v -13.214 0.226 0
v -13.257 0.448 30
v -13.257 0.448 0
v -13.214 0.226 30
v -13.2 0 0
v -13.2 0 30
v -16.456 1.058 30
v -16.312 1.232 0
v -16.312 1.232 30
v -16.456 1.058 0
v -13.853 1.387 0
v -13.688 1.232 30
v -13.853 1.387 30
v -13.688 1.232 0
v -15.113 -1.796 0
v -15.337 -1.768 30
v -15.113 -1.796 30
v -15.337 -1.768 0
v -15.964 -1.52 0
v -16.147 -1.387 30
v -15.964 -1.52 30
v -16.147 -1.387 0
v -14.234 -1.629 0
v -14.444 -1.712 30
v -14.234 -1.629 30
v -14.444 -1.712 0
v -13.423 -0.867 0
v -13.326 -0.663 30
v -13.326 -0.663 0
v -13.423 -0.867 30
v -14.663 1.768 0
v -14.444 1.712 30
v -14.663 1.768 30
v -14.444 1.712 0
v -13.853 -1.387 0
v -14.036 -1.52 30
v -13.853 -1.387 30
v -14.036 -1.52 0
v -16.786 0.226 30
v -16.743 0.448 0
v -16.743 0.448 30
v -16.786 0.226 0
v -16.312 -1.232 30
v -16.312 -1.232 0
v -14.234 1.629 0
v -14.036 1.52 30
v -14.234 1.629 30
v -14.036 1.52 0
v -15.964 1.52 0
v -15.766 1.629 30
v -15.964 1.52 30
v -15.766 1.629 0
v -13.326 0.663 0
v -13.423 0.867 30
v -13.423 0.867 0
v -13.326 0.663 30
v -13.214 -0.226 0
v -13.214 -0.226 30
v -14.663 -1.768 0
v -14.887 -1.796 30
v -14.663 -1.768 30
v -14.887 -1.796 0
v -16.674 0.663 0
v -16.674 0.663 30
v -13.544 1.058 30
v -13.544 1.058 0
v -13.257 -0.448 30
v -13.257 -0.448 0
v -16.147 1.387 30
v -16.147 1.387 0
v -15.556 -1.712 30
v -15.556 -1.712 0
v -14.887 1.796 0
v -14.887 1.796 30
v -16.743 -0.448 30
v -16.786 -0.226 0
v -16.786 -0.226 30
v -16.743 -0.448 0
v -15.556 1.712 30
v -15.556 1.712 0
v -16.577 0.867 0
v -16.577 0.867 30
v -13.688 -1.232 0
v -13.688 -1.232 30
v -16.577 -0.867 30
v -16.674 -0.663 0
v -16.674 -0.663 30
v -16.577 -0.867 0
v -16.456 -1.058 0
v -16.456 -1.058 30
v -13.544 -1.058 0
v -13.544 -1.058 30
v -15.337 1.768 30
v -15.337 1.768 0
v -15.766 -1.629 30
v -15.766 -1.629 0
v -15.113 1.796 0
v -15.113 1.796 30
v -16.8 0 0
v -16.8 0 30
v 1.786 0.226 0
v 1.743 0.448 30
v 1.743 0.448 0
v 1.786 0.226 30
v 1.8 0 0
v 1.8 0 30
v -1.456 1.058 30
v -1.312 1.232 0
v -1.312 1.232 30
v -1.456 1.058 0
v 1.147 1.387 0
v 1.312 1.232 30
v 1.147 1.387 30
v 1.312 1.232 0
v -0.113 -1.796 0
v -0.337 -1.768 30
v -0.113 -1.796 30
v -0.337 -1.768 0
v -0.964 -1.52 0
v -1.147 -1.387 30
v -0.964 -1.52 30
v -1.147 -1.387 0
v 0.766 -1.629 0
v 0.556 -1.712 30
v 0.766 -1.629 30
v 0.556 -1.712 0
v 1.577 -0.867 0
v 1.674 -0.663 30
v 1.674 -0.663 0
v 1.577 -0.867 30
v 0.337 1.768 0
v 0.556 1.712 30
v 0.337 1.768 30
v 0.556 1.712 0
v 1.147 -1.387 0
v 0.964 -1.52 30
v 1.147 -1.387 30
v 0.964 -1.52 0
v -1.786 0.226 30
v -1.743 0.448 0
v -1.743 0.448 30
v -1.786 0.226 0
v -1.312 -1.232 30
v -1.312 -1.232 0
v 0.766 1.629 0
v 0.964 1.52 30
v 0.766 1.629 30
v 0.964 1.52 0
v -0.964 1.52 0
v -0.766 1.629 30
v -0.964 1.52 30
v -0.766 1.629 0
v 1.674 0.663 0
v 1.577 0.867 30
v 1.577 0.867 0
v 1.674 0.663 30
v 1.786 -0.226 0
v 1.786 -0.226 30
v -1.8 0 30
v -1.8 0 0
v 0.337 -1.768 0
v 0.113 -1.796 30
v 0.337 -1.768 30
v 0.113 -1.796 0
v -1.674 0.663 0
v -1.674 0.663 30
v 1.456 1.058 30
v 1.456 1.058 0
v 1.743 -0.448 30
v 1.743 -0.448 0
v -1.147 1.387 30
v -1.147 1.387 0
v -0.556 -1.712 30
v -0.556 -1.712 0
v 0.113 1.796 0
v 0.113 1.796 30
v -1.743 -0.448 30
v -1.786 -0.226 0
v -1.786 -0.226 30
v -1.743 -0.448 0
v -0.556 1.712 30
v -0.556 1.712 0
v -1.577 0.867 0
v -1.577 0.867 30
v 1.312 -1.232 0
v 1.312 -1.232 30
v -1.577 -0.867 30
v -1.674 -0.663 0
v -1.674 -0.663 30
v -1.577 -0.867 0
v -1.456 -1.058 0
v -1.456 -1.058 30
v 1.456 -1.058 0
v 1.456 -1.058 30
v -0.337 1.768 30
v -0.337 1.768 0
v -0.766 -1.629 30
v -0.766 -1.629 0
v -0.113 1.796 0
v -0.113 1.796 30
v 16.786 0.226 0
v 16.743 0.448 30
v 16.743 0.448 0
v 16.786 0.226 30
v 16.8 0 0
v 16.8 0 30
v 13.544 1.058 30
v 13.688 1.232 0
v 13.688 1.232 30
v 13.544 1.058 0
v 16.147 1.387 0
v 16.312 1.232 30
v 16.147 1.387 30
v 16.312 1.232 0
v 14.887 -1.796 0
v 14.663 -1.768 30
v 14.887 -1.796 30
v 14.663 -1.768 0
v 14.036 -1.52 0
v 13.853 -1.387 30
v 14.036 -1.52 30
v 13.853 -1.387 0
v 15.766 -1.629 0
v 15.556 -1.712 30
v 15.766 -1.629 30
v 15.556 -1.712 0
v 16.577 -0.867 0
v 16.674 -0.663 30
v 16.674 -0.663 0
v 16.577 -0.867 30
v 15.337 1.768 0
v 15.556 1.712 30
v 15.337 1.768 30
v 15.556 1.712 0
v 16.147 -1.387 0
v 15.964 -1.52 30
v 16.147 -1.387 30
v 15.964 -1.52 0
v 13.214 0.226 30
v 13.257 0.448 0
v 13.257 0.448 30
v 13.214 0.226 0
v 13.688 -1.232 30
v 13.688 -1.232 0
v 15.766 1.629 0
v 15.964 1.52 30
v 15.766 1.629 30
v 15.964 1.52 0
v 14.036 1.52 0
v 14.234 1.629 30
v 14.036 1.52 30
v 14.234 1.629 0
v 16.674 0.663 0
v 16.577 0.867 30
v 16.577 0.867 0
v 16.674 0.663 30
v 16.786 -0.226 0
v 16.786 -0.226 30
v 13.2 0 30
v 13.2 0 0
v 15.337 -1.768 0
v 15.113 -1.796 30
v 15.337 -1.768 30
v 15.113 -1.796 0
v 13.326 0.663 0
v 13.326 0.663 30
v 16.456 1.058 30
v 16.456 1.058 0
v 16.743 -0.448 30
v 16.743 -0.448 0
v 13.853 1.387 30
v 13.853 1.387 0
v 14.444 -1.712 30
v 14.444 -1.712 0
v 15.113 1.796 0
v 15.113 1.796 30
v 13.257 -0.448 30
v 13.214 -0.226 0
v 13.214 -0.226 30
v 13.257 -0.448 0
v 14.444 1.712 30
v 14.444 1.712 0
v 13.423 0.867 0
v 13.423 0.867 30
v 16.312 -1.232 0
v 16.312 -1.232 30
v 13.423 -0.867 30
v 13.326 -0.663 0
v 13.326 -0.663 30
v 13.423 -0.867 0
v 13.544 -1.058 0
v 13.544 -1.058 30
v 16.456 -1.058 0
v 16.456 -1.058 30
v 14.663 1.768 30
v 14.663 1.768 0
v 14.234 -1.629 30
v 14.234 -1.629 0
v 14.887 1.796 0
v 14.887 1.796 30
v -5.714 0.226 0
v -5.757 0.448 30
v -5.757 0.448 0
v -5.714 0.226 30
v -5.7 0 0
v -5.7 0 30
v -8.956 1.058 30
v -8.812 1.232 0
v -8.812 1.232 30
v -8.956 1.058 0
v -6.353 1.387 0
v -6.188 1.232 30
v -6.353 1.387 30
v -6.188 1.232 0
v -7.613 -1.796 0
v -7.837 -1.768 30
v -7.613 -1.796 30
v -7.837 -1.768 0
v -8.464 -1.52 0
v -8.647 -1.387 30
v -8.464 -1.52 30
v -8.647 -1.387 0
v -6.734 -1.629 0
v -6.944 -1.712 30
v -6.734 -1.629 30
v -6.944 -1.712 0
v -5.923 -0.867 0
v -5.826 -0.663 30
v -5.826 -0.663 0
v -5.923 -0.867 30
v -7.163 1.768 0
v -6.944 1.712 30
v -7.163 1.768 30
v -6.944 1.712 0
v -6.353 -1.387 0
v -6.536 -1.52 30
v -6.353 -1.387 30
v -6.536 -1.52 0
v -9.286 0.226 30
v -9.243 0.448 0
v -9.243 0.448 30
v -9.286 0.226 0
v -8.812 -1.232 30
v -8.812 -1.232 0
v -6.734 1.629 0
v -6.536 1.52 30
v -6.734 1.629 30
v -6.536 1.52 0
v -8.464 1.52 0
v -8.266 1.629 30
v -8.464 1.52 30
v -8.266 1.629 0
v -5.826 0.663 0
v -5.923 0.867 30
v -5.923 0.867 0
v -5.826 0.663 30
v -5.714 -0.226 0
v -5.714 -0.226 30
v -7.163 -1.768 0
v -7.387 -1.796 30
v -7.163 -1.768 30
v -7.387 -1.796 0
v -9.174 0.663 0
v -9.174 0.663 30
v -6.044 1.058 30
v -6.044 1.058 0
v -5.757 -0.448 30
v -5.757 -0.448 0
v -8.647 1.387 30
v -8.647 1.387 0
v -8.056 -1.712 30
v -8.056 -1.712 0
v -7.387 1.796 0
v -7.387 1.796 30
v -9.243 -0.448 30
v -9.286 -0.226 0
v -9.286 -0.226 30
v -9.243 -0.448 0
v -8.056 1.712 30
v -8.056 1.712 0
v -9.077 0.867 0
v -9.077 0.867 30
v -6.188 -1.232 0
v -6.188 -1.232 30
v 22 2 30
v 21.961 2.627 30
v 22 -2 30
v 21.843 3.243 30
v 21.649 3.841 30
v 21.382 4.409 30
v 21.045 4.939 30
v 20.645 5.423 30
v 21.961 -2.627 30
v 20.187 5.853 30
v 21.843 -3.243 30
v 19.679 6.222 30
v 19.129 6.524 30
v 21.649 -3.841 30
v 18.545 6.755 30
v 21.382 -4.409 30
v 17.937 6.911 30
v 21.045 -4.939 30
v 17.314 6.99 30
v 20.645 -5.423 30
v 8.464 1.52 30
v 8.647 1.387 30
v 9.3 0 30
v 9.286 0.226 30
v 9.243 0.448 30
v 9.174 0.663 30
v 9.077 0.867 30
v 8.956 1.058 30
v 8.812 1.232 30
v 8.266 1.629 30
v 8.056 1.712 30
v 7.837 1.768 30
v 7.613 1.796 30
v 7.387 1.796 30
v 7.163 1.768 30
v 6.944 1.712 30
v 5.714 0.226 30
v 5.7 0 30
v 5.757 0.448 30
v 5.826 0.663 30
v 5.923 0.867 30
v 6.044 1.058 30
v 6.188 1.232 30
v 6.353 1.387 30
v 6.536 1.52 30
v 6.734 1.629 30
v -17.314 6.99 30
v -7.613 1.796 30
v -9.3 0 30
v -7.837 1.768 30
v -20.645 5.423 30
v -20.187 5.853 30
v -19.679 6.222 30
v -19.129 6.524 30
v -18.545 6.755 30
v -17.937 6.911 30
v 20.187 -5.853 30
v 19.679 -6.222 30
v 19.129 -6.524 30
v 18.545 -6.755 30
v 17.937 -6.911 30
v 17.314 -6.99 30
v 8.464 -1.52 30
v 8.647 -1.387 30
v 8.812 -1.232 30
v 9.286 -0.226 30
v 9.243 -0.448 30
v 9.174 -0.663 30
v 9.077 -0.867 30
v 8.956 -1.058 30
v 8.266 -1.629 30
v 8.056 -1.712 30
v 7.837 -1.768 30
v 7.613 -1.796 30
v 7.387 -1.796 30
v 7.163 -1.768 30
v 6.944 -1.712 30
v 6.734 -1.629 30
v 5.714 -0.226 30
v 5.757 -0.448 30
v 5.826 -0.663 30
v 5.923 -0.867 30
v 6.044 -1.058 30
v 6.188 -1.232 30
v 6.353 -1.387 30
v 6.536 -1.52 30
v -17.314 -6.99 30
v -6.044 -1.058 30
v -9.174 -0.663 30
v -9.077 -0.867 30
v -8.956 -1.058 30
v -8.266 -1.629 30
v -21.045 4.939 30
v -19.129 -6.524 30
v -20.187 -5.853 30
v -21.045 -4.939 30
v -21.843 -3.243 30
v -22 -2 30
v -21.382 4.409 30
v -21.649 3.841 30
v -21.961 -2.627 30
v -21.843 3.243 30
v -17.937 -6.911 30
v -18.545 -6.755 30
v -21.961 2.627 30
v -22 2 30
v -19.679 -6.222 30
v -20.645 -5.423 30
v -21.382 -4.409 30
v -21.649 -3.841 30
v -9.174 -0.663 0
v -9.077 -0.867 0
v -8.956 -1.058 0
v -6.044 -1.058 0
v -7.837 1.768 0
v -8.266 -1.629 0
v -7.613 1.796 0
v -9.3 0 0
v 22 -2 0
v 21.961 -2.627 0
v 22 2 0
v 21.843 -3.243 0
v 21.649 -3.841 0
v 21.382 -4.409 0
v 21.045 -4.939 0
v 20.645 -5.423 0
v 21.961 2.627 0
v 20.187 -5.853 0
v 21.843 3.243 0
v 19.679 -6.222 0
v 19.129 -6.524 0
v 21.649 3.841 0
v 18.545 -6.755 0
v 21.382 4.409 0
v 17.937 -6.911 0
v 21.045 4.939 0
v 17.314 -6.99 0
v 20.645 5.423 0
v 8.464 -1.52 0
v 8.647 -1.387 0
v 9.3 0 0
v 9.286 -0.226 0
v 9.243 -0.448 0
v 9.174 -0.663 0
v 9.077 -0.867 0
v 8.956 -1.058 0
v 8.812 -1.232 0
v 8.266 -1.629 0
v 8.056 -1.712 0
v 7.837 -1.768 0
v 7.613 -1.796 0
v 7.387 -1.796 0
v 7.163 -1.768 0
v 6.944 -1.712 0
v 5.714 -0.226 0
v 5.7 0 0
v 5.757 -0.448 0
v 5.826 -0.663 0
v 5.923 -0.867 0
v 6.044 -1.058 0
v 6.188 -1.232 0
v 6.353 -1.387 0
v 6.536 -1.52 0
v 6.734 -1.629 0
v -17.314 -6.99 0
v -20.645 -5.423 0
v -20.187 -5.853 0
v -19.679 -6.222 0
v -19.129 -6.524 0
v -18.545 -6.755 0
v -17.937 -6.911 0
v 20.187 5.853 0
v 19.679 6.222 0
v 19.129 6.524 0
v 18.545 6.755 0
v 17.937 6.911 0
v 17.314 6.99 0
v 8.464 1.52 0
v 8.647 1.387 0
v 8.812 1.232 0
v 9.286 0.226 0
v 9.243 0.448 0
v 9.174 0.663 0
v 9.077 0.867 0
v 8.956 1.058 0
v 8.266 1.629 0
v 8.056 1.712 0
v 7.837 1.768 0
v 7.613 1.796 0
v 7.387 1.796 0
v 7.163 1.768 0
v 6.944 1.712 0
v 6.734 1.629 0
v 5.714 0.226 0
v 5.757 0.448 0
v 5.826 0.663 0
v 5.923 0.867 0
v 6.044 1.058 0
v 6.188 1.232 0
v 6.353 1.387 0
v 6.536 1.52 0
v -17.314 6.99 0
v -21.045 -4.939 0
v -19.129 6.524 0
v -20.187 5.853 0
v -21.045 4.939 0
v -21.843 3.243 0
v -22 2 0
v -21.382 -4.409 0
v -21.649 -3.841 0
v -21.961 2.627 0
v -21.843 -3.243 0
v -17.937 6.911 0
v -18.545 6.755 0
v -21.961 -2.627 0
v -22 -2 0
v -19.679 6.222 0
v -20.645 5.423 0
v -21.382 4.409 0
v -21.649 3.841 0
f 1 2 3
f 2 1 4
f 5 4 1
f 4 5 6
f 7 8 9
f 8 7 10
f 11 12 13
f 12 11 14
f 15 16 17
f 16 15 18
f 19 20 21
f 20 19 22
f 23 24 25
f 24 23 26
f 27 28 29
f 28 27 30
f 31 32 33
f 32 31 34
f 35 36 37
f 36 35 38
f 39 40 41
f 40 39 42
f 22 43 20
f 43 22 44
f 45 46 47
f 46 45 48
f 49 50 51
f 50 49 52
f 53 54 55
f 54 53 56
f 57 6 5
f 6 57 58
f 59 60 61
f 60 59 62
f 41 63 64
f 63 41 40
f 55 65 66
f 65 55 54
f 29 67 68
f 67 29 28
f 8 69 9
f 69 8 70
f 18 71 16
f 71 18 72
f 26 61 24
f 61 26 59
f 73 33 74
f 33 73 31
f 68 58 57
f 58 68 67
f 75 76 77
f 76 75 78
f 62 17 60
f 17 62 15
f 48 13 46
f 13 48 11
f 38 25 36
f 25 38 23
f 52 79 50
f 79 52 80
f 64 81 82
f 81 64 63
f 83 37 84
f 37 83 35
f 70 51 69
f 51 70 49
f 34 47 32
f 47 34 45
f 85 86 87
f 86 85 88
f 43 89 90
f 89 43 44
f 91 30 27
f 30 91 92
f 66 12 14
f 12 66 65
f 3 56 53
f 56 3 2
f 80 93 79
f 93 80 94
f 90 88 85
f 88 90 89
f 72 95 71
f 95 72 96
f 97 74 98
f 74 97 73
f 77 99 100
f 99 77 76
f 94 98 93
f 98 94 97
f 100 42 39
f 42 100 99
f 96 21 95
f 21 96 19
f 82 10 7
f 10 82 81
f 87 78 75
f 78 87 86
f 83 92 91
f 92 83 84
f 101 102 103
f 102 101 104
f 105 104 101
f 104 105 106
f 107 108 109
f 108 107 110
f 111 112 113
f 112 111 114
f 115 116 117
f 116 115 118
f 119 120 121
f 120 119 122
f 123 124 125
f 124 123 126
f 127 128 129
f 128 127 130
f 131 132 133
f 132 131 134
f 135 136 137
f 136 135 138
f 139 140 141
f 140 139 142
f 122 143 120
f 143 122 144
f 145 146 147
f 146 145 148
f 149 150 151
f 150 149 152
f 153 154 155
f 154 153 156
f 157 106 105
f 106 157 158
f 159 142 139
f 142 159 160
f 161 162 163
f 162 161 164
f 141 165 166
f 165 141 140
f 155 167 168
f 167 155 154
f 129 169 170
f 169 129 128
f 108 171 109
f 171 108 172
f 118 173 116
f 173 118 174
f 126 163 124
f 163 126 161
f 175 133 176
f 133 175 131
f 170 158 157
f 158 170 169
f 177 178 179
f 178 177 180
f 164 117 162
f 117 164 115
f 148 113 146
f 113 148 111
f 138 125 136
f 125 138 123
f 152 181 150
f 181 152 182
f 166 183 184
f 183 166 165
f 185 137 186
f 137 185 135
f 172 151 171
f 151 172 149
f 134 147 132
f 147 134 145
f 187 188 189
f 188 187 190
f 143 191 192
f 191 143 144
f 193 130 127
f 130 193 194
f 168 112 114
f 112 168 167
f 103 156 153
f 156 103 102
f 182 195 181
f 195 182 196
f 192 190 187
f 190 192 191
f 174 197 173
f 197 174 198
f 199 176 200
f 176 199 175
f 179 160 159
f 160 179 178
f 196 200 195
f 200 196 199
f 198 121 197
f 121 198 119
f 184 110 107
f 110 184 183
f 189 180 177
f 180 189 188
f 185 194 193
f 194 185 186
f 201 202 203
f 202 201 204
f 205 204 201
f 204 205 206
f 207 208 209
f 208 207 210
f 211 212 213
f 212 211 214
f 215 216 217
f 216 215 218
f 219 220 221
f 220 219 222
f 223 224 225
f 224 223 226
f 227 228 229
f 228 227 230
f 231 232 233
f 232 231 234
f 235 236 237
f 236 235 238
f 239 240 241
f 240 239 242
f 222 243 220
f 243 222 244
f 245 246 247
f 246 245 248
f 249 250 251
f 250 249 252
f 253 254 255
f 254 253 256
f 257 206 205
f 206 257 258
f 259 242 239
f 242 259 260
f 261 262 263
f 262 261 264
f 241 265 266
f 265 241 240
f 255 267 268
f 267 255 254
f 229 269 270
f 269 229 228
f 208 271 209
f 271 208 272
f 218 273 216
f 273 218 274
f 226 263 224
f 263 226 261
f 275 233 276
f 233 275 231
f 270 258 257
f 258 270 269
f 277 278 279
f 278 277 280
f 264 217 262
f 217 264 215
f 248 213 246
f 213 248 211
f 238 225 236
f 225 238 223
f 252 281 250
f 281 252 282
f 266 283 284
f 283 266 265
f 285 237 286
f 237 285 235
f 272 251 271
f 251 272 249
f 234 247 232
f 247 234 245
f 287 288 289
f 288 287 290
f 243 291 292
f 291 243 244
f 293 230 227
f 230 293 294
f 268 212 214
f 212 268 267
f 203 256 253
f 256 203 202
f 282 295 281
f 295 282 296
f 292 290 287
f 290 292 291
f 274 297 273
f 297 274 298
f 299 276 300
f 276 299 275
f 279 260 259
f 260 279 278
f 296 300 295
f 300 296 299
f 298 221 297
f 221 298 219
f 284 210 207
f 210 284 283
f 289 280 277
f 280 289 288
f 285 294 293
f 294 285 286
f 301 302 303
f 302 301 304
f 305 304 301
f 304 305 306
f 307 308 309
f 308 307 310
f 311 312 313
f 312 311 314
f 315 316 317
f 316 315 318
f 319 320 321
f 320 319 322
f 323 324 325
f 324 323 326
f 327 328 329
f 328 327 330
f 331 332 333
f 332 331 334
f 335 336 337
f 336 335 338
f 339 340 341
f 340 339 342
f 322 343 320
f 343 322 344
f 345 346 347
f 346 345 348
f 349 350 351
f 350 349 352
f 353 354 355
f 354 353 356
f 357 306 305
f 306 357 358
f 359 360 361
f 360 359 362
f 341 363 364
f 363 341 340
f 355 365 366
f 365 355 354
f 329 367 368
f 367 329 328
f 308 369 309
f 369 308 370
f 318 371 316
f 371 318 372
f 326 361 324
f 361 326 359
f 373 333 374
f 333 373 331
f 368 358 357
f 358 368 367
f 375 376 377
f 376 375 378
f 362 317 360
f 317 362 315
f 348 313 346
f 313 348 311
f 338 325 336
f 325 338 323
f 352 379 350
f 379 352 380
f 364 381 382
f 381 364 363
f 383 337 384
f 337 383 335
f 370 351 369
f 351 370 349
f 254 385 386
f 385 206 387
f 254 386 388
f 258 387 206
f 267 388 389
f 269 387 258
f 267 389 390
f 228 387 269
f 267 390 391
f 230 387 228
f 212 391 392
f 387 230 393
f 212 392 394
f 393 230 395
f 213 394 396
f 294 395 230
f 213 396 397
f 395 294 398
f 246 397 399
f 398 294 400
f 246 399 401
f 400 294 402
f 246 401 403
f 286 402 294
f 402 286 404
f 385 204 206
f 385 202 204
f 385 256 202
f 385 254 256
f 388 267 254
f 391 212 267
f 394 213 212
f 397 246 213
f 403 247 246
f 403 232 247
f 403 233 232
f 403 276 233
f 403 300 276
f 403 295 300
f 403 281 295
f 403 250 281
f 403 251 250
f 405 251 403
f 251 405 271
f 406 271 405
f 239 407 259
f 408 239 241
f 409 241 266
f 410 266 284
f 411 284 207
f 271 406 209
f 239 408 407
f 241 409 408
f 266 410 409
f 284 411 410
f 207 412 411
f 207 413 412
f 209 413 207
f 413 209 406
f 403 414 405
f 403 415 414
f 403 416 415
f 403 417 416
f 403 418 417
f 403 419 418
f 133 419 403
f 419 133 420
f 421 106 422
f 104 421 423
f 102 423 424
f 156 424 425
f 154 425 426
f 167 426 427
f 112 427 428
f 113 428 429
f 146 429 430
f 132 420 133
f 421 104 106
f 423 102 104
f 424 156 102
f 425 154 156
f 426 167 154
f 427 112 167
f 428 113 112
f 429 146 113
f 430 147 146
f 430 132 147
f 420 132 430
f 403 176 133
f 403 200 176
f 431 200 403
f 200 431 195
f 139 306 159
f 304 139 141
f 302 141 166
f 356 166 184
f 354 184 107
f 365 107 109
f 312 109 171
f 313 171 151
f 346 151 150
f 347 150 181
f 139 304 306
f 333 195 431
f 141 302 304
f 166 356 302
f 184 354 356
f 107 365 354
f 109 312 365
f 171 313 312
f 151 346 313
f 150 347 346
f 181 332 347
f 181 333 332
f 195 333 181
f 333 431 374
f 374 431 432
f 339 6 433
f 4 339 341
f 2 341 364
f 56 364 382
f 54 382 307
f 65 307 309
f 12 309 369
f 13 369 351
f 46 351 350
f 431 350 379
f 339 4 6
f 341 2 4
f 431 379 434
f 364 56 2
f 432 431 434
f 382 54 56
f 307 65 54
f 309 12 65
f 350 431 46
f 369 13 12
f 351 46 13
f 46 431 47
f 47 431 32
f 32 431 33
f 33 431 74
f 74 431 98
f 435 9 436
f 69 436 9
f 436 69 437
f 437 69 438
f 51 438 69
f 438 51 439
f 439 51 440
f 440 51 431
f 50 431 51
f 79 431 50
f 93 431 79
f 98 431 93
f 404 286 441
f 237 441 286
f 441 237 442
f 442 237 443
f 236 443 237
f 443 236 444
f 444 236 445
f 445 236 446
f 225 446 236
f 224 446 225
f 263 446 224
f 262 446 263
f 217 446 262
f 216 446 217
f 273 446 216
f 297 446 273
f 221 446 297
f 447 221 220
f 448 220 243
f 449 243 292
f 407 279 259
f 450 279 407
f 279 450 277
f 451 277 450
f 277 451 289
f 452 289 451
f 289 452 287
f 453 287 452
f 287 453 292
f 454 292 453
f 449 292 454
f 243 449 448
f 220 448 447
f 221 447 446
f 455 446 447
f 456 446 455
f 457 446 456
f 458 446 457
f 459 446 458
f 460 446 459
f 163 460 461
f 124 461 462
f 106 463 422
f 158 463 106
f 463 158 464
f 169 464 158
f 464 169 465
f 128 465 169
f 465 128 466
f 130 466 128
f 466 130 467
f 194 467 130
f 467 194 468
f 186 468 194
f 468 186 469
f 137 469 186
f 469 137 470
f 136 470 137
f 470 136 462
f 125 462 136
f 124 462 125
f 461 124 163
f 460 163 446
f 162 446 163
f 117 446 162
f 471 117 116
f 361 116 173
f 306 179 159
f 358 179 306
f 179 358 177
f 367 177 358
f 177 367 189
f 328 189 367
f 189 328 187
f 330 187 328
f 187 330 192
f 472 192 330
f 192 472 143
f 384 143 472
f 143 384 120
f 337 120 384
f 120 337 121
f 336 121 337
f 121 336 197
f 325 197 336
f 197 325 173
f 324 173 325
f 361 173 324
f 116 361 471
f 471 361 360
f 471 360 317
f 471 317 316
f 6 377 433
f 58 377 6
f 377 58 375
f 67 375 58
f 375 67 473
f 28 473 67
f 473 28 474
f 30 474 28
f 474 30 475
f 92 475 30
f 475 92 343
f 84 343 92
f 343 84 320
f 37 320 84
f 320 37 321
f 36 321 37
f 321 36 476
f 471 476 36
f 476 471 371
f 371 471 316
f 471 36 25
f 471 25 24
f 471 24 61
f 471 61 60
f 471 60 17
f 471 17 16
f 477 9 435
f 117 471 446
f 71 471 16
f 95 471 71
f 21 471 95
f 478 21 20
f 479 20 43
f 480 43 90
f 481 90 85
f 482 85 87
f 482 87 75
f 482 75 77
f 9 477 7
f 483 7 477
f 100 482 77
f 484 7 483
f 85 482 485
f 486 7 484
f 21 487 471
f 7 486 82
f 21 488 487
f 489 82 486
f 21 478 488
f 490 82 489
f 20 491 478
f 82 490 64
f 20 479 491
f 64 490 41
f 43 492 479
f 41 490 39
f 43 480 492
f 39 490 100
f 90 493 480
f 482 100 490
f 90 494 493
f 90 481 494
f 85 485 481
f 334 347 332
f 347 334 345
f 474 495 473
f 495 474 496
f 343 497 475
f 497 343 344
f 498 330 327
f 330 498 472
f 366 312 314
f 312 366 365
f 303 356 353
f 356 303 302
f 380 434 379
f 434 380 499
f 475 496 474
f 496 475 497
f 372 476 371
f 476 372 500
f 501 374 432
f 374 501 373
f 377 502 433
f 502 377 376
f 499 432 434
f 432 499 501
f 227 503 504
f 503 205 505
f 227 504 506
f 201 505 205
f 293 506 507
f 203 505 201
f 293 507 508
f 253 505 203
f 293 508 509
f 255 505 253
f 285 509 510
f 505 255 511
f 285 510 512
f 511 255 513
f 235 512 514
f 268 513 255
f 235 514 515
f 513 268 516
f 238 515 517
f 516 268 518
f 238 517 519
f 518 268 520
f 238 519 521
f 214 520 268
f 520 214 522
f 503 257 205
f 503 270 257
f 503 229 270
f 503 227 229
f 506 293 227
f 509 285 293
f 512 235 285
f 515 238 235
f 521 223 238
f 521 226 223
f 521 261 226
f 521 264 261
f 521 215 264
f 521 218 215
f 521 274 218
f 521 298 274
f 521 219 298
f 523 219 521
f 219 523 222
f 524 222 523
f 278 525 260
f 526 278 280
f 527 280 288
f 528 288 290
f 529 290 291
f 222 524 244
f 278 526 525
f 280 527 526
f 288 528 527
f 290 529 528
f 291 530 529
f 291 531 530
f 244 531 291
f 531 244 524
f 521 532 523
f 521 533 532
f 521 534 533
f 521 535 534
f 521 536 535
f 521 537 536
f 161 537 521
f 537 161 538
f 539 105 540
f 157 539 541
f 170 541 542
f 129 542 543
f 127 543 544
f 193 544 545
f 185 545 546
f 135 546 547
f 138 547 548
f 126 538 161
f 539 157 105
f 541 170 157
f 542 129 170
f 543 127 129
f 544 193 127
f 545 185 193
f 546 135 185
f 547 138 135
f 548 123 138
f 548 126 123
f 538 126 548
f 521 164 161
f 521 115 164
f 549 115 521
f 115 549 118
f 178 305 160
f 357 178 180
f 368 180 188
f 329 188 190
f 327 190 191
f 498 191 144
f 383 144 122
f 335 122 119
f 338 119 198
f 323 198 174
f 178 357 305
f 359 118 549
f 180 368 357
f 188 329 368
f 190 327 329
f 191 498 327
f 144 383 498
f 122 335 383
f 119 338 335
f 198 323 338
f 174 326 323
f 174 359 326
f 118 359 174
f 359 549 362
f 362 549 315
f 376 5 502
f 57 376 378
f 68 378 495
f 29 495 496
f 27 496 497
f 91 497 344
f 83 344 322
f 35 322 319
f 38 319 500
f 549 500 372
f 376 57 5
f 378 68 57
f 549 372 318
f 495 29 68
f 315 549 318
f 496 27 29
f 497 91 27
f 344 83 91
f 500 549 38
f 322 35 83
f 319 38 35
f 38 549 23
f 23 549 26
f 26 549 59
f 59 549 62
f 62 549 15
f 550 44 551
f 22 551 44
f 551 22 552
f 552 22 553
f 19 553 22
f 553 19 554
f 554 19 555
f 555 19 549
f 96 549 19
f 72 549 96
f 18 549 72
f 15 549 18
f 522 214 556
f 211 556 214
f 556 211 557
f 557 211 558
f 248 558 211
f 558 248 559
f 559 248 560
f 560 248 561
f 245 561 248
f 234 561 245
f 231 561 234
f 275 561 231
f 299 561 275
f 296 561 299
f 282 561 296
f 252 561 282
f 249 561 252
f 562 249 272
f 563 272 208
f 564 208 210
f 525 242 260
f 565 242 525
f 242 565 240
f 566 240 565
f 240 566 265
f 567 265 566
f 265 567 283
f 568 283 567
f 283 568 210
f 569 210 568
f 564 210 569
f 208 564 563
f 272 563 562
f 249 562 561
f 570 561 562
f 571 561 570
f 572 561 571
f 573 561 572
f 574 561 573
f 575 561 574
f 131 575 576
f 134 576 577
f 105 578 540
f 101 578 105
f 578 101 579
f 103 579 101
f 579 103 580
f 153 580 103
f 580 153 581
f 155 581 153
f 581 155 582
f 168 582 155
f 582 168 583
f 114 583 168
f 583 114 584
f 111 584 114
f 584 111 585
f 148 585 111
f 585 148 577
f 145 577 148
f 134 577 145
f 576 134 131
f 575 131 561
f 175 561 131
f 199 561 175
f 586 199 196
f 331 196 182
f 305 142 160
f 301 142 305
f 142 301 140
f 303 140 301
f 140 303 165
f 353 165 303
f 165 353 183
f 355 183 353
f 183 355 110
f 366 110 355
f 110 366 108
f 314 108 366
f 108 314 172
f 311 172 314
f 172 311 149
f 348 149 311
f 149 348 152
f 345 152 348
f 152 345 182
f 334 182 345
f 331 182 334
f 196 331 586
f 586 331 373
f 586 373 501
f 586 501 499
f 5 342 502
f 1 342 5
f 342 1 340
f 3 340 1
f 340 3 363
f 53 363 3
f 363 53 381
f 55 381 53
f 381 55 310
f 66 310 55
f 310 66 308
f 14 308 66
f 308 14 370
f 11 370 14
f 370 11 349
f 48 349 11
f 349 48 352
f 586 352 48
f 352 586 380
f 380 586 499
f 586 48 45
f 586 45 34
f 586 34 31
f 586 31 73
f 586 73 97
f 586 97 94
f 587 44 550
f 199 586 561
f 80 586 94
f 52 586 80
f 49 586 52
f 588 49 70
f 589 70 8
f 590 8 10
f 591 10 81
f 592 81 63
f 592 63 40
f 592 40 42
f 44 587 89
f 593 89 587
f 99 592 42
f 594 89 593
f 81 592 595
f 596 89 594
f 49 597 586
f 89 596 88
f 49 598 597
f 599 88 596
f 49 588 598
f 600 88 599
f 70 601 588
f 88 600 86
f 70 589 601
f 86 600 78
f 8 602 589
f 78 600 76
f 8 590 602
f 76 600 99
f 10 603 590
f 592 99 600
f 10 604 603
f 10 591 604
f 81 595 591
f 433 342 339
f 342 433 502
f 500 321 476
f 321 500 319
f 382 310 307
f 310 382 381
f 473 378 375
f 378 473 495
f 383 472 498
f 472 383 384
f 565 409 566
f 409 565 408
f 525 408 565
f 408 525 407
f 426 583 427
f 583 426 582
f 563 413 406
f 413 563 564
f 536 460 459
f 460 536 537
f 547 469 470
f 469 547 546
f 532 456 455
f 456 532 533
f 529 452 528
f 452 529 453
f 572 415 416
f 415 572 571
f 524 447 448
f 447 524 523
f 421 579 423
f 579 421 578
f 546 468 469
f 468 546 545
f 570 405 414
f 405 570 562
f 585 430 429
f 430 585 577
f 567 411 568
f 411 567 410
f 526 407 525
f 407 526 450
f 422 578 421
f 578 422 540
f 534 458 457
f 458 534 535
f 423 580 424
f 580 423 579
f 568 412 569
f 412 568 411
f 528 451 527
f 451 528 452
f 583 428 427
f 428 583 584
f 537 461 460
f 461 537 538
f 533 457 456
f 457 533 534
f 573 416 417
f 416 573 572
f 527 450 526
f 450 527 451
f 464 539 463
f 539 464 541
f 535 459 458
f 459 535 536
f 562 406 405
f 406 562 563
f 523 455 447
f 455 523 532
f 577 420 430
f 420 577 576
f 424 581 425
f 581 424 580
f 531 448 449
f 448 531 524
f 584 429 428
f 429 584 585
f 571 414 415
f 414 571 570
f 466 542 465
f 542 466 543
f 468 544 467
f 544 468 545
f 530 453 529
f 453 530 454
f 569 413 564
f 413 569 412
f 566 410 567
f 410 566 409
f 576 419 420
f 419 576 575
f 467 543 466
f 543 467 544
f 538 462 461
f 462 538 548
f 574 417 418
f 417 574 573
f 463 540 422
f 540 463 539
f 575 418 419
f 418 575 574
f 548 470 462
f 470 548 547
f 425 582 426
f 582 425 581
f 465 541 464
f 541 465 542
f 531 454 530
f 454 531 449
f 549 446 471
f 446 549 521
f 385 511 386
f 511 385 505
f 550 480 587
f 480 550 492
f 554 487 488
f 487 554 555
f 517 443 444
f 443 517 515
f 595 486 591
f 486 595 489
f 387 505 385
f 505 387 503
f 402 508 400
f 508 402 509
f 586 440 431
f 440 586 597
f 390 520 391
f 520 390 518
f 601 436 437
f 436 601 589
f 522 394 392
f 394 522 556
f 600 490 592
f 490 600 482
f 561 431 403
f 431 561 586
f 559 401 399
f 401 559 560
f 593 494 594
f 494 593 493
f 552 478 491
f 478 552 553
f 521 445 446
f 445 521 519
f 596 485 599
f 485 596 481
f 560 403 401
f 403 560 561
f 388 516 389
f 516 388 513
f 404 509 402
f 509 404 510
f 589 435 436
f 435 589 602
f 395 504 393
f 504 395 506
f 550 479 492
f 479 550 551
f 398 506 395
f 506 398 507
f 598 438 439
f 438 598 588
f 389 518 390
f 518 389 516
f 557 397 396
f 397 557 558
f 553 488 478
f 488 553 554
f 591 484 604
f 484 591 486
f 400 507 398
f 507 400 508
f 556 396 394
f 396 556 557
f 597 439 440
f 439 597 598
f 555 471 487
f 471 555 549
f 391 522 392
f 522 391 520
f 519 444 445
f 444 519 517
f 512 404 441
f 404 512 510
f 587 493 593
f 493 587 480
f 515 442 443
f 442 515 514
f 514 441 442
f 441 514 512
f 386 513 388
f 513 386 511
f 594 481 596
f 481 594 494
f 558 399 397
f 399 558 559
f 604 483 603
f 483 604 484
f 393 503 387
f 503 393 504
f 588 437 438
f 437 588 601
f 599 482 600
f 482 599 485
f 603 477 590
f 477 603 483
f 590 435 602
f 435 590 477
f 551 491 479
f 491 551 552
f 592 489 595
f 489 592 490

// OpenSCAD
$fn = 50;


difference() {
	union() {
		hull() {
			translate(v = [-17.0000000000, 2.0000000000, 0]) {
				cylinder(h = 30, r = 5);
			}
			translate(v = [17.0000000000, 2.0000000000, 0]) {
				cylinder(h = 30, r = 5);
			}
			translate(v = [-17.0000000000, -2.0000000000, 0]) {
				cylinder(h = 30, r = 5);
			}
			translate(v = [17.0000000000, -2.0000000000, 0]) {
				cylinder(h = 30, r = 5);
			}
		}
	}
	union() {
		translate(v = [-15.0000000000, 0.0000000000, -100.0000000000]) {
			cylinder(h = 200, r = 1.8000000000);
		}
		translate(v = [0.0000000000, 0.0000000000, -100.0000000000]) {
			cylinder(h = 200, r = 1.8000000000);
		}
		translate(v = [15.0000000000, 0.0000000000, -100.0000000000]) {
			cylinder(h = 200, r = 1.8000000000);
		}
		translate(v = [-15.0000000000, 0.0000000000, 0]) {
			cylinder(h = 30, r = 1.8000000000);
		}
		translate(v = [-7.5000000000, 0.0000000000, 0]) {
			cylinder(h = 30, r = 1.8000000000);
		}
		cylinder(h = 30, r = 1.8000000000);
		translate(v = [7.5000000000, 0.0000000000, 0]) {
			cylinder(h = 30, r = 1.8000000000);
		}
		translate(v = [15.0000000000, 0.0000000000, 0]) {
			cylinder(h = 30, r = 1.8000000000);
		}
		translate(v = [-15.0000000000, 0.0000000000, 0]) {
			cylinder(h = 30, r = 1.8000000000);
		}
		translate(v = [-7.5000000000, 0.0000000000, 0]) {
			cylinder(h = 30, r = 1.8000000000);
		}
		cylinder(h = 30, r = 1.8000000000);
		translate(v = [7.5000000000, 0.0000000000, 0]) {
			cylinder(h = 30, r = 1.8000000000);
		}
		translate(v = [15.0000000000, 0.0000000000, 0]) {
			cylinder(h = 30, r = 1.8000000000);
		}
		translate(v = [-15.0000000000, 0.0000000000, 0]) {
			cylinder(h = 30, r = 1.8000000000);
		}
		translate(v = [-7.5000000000, 0.0000000000, 0]) {
			cylinder(h = 30, r = 1.8000000000);
		}
		cylinder(h = 30, r = 1.8000000000);
		translate(v = [7.5000000000, 0.0000000000, 0]) {
			cylinder(h = 30, r = 1.8000000000);
		}
		translate(v = [15.0000000000, 0.0000000000, 0]) {
			cylinder(h = 30, r = 1.8000000000);
		}
	}
}
